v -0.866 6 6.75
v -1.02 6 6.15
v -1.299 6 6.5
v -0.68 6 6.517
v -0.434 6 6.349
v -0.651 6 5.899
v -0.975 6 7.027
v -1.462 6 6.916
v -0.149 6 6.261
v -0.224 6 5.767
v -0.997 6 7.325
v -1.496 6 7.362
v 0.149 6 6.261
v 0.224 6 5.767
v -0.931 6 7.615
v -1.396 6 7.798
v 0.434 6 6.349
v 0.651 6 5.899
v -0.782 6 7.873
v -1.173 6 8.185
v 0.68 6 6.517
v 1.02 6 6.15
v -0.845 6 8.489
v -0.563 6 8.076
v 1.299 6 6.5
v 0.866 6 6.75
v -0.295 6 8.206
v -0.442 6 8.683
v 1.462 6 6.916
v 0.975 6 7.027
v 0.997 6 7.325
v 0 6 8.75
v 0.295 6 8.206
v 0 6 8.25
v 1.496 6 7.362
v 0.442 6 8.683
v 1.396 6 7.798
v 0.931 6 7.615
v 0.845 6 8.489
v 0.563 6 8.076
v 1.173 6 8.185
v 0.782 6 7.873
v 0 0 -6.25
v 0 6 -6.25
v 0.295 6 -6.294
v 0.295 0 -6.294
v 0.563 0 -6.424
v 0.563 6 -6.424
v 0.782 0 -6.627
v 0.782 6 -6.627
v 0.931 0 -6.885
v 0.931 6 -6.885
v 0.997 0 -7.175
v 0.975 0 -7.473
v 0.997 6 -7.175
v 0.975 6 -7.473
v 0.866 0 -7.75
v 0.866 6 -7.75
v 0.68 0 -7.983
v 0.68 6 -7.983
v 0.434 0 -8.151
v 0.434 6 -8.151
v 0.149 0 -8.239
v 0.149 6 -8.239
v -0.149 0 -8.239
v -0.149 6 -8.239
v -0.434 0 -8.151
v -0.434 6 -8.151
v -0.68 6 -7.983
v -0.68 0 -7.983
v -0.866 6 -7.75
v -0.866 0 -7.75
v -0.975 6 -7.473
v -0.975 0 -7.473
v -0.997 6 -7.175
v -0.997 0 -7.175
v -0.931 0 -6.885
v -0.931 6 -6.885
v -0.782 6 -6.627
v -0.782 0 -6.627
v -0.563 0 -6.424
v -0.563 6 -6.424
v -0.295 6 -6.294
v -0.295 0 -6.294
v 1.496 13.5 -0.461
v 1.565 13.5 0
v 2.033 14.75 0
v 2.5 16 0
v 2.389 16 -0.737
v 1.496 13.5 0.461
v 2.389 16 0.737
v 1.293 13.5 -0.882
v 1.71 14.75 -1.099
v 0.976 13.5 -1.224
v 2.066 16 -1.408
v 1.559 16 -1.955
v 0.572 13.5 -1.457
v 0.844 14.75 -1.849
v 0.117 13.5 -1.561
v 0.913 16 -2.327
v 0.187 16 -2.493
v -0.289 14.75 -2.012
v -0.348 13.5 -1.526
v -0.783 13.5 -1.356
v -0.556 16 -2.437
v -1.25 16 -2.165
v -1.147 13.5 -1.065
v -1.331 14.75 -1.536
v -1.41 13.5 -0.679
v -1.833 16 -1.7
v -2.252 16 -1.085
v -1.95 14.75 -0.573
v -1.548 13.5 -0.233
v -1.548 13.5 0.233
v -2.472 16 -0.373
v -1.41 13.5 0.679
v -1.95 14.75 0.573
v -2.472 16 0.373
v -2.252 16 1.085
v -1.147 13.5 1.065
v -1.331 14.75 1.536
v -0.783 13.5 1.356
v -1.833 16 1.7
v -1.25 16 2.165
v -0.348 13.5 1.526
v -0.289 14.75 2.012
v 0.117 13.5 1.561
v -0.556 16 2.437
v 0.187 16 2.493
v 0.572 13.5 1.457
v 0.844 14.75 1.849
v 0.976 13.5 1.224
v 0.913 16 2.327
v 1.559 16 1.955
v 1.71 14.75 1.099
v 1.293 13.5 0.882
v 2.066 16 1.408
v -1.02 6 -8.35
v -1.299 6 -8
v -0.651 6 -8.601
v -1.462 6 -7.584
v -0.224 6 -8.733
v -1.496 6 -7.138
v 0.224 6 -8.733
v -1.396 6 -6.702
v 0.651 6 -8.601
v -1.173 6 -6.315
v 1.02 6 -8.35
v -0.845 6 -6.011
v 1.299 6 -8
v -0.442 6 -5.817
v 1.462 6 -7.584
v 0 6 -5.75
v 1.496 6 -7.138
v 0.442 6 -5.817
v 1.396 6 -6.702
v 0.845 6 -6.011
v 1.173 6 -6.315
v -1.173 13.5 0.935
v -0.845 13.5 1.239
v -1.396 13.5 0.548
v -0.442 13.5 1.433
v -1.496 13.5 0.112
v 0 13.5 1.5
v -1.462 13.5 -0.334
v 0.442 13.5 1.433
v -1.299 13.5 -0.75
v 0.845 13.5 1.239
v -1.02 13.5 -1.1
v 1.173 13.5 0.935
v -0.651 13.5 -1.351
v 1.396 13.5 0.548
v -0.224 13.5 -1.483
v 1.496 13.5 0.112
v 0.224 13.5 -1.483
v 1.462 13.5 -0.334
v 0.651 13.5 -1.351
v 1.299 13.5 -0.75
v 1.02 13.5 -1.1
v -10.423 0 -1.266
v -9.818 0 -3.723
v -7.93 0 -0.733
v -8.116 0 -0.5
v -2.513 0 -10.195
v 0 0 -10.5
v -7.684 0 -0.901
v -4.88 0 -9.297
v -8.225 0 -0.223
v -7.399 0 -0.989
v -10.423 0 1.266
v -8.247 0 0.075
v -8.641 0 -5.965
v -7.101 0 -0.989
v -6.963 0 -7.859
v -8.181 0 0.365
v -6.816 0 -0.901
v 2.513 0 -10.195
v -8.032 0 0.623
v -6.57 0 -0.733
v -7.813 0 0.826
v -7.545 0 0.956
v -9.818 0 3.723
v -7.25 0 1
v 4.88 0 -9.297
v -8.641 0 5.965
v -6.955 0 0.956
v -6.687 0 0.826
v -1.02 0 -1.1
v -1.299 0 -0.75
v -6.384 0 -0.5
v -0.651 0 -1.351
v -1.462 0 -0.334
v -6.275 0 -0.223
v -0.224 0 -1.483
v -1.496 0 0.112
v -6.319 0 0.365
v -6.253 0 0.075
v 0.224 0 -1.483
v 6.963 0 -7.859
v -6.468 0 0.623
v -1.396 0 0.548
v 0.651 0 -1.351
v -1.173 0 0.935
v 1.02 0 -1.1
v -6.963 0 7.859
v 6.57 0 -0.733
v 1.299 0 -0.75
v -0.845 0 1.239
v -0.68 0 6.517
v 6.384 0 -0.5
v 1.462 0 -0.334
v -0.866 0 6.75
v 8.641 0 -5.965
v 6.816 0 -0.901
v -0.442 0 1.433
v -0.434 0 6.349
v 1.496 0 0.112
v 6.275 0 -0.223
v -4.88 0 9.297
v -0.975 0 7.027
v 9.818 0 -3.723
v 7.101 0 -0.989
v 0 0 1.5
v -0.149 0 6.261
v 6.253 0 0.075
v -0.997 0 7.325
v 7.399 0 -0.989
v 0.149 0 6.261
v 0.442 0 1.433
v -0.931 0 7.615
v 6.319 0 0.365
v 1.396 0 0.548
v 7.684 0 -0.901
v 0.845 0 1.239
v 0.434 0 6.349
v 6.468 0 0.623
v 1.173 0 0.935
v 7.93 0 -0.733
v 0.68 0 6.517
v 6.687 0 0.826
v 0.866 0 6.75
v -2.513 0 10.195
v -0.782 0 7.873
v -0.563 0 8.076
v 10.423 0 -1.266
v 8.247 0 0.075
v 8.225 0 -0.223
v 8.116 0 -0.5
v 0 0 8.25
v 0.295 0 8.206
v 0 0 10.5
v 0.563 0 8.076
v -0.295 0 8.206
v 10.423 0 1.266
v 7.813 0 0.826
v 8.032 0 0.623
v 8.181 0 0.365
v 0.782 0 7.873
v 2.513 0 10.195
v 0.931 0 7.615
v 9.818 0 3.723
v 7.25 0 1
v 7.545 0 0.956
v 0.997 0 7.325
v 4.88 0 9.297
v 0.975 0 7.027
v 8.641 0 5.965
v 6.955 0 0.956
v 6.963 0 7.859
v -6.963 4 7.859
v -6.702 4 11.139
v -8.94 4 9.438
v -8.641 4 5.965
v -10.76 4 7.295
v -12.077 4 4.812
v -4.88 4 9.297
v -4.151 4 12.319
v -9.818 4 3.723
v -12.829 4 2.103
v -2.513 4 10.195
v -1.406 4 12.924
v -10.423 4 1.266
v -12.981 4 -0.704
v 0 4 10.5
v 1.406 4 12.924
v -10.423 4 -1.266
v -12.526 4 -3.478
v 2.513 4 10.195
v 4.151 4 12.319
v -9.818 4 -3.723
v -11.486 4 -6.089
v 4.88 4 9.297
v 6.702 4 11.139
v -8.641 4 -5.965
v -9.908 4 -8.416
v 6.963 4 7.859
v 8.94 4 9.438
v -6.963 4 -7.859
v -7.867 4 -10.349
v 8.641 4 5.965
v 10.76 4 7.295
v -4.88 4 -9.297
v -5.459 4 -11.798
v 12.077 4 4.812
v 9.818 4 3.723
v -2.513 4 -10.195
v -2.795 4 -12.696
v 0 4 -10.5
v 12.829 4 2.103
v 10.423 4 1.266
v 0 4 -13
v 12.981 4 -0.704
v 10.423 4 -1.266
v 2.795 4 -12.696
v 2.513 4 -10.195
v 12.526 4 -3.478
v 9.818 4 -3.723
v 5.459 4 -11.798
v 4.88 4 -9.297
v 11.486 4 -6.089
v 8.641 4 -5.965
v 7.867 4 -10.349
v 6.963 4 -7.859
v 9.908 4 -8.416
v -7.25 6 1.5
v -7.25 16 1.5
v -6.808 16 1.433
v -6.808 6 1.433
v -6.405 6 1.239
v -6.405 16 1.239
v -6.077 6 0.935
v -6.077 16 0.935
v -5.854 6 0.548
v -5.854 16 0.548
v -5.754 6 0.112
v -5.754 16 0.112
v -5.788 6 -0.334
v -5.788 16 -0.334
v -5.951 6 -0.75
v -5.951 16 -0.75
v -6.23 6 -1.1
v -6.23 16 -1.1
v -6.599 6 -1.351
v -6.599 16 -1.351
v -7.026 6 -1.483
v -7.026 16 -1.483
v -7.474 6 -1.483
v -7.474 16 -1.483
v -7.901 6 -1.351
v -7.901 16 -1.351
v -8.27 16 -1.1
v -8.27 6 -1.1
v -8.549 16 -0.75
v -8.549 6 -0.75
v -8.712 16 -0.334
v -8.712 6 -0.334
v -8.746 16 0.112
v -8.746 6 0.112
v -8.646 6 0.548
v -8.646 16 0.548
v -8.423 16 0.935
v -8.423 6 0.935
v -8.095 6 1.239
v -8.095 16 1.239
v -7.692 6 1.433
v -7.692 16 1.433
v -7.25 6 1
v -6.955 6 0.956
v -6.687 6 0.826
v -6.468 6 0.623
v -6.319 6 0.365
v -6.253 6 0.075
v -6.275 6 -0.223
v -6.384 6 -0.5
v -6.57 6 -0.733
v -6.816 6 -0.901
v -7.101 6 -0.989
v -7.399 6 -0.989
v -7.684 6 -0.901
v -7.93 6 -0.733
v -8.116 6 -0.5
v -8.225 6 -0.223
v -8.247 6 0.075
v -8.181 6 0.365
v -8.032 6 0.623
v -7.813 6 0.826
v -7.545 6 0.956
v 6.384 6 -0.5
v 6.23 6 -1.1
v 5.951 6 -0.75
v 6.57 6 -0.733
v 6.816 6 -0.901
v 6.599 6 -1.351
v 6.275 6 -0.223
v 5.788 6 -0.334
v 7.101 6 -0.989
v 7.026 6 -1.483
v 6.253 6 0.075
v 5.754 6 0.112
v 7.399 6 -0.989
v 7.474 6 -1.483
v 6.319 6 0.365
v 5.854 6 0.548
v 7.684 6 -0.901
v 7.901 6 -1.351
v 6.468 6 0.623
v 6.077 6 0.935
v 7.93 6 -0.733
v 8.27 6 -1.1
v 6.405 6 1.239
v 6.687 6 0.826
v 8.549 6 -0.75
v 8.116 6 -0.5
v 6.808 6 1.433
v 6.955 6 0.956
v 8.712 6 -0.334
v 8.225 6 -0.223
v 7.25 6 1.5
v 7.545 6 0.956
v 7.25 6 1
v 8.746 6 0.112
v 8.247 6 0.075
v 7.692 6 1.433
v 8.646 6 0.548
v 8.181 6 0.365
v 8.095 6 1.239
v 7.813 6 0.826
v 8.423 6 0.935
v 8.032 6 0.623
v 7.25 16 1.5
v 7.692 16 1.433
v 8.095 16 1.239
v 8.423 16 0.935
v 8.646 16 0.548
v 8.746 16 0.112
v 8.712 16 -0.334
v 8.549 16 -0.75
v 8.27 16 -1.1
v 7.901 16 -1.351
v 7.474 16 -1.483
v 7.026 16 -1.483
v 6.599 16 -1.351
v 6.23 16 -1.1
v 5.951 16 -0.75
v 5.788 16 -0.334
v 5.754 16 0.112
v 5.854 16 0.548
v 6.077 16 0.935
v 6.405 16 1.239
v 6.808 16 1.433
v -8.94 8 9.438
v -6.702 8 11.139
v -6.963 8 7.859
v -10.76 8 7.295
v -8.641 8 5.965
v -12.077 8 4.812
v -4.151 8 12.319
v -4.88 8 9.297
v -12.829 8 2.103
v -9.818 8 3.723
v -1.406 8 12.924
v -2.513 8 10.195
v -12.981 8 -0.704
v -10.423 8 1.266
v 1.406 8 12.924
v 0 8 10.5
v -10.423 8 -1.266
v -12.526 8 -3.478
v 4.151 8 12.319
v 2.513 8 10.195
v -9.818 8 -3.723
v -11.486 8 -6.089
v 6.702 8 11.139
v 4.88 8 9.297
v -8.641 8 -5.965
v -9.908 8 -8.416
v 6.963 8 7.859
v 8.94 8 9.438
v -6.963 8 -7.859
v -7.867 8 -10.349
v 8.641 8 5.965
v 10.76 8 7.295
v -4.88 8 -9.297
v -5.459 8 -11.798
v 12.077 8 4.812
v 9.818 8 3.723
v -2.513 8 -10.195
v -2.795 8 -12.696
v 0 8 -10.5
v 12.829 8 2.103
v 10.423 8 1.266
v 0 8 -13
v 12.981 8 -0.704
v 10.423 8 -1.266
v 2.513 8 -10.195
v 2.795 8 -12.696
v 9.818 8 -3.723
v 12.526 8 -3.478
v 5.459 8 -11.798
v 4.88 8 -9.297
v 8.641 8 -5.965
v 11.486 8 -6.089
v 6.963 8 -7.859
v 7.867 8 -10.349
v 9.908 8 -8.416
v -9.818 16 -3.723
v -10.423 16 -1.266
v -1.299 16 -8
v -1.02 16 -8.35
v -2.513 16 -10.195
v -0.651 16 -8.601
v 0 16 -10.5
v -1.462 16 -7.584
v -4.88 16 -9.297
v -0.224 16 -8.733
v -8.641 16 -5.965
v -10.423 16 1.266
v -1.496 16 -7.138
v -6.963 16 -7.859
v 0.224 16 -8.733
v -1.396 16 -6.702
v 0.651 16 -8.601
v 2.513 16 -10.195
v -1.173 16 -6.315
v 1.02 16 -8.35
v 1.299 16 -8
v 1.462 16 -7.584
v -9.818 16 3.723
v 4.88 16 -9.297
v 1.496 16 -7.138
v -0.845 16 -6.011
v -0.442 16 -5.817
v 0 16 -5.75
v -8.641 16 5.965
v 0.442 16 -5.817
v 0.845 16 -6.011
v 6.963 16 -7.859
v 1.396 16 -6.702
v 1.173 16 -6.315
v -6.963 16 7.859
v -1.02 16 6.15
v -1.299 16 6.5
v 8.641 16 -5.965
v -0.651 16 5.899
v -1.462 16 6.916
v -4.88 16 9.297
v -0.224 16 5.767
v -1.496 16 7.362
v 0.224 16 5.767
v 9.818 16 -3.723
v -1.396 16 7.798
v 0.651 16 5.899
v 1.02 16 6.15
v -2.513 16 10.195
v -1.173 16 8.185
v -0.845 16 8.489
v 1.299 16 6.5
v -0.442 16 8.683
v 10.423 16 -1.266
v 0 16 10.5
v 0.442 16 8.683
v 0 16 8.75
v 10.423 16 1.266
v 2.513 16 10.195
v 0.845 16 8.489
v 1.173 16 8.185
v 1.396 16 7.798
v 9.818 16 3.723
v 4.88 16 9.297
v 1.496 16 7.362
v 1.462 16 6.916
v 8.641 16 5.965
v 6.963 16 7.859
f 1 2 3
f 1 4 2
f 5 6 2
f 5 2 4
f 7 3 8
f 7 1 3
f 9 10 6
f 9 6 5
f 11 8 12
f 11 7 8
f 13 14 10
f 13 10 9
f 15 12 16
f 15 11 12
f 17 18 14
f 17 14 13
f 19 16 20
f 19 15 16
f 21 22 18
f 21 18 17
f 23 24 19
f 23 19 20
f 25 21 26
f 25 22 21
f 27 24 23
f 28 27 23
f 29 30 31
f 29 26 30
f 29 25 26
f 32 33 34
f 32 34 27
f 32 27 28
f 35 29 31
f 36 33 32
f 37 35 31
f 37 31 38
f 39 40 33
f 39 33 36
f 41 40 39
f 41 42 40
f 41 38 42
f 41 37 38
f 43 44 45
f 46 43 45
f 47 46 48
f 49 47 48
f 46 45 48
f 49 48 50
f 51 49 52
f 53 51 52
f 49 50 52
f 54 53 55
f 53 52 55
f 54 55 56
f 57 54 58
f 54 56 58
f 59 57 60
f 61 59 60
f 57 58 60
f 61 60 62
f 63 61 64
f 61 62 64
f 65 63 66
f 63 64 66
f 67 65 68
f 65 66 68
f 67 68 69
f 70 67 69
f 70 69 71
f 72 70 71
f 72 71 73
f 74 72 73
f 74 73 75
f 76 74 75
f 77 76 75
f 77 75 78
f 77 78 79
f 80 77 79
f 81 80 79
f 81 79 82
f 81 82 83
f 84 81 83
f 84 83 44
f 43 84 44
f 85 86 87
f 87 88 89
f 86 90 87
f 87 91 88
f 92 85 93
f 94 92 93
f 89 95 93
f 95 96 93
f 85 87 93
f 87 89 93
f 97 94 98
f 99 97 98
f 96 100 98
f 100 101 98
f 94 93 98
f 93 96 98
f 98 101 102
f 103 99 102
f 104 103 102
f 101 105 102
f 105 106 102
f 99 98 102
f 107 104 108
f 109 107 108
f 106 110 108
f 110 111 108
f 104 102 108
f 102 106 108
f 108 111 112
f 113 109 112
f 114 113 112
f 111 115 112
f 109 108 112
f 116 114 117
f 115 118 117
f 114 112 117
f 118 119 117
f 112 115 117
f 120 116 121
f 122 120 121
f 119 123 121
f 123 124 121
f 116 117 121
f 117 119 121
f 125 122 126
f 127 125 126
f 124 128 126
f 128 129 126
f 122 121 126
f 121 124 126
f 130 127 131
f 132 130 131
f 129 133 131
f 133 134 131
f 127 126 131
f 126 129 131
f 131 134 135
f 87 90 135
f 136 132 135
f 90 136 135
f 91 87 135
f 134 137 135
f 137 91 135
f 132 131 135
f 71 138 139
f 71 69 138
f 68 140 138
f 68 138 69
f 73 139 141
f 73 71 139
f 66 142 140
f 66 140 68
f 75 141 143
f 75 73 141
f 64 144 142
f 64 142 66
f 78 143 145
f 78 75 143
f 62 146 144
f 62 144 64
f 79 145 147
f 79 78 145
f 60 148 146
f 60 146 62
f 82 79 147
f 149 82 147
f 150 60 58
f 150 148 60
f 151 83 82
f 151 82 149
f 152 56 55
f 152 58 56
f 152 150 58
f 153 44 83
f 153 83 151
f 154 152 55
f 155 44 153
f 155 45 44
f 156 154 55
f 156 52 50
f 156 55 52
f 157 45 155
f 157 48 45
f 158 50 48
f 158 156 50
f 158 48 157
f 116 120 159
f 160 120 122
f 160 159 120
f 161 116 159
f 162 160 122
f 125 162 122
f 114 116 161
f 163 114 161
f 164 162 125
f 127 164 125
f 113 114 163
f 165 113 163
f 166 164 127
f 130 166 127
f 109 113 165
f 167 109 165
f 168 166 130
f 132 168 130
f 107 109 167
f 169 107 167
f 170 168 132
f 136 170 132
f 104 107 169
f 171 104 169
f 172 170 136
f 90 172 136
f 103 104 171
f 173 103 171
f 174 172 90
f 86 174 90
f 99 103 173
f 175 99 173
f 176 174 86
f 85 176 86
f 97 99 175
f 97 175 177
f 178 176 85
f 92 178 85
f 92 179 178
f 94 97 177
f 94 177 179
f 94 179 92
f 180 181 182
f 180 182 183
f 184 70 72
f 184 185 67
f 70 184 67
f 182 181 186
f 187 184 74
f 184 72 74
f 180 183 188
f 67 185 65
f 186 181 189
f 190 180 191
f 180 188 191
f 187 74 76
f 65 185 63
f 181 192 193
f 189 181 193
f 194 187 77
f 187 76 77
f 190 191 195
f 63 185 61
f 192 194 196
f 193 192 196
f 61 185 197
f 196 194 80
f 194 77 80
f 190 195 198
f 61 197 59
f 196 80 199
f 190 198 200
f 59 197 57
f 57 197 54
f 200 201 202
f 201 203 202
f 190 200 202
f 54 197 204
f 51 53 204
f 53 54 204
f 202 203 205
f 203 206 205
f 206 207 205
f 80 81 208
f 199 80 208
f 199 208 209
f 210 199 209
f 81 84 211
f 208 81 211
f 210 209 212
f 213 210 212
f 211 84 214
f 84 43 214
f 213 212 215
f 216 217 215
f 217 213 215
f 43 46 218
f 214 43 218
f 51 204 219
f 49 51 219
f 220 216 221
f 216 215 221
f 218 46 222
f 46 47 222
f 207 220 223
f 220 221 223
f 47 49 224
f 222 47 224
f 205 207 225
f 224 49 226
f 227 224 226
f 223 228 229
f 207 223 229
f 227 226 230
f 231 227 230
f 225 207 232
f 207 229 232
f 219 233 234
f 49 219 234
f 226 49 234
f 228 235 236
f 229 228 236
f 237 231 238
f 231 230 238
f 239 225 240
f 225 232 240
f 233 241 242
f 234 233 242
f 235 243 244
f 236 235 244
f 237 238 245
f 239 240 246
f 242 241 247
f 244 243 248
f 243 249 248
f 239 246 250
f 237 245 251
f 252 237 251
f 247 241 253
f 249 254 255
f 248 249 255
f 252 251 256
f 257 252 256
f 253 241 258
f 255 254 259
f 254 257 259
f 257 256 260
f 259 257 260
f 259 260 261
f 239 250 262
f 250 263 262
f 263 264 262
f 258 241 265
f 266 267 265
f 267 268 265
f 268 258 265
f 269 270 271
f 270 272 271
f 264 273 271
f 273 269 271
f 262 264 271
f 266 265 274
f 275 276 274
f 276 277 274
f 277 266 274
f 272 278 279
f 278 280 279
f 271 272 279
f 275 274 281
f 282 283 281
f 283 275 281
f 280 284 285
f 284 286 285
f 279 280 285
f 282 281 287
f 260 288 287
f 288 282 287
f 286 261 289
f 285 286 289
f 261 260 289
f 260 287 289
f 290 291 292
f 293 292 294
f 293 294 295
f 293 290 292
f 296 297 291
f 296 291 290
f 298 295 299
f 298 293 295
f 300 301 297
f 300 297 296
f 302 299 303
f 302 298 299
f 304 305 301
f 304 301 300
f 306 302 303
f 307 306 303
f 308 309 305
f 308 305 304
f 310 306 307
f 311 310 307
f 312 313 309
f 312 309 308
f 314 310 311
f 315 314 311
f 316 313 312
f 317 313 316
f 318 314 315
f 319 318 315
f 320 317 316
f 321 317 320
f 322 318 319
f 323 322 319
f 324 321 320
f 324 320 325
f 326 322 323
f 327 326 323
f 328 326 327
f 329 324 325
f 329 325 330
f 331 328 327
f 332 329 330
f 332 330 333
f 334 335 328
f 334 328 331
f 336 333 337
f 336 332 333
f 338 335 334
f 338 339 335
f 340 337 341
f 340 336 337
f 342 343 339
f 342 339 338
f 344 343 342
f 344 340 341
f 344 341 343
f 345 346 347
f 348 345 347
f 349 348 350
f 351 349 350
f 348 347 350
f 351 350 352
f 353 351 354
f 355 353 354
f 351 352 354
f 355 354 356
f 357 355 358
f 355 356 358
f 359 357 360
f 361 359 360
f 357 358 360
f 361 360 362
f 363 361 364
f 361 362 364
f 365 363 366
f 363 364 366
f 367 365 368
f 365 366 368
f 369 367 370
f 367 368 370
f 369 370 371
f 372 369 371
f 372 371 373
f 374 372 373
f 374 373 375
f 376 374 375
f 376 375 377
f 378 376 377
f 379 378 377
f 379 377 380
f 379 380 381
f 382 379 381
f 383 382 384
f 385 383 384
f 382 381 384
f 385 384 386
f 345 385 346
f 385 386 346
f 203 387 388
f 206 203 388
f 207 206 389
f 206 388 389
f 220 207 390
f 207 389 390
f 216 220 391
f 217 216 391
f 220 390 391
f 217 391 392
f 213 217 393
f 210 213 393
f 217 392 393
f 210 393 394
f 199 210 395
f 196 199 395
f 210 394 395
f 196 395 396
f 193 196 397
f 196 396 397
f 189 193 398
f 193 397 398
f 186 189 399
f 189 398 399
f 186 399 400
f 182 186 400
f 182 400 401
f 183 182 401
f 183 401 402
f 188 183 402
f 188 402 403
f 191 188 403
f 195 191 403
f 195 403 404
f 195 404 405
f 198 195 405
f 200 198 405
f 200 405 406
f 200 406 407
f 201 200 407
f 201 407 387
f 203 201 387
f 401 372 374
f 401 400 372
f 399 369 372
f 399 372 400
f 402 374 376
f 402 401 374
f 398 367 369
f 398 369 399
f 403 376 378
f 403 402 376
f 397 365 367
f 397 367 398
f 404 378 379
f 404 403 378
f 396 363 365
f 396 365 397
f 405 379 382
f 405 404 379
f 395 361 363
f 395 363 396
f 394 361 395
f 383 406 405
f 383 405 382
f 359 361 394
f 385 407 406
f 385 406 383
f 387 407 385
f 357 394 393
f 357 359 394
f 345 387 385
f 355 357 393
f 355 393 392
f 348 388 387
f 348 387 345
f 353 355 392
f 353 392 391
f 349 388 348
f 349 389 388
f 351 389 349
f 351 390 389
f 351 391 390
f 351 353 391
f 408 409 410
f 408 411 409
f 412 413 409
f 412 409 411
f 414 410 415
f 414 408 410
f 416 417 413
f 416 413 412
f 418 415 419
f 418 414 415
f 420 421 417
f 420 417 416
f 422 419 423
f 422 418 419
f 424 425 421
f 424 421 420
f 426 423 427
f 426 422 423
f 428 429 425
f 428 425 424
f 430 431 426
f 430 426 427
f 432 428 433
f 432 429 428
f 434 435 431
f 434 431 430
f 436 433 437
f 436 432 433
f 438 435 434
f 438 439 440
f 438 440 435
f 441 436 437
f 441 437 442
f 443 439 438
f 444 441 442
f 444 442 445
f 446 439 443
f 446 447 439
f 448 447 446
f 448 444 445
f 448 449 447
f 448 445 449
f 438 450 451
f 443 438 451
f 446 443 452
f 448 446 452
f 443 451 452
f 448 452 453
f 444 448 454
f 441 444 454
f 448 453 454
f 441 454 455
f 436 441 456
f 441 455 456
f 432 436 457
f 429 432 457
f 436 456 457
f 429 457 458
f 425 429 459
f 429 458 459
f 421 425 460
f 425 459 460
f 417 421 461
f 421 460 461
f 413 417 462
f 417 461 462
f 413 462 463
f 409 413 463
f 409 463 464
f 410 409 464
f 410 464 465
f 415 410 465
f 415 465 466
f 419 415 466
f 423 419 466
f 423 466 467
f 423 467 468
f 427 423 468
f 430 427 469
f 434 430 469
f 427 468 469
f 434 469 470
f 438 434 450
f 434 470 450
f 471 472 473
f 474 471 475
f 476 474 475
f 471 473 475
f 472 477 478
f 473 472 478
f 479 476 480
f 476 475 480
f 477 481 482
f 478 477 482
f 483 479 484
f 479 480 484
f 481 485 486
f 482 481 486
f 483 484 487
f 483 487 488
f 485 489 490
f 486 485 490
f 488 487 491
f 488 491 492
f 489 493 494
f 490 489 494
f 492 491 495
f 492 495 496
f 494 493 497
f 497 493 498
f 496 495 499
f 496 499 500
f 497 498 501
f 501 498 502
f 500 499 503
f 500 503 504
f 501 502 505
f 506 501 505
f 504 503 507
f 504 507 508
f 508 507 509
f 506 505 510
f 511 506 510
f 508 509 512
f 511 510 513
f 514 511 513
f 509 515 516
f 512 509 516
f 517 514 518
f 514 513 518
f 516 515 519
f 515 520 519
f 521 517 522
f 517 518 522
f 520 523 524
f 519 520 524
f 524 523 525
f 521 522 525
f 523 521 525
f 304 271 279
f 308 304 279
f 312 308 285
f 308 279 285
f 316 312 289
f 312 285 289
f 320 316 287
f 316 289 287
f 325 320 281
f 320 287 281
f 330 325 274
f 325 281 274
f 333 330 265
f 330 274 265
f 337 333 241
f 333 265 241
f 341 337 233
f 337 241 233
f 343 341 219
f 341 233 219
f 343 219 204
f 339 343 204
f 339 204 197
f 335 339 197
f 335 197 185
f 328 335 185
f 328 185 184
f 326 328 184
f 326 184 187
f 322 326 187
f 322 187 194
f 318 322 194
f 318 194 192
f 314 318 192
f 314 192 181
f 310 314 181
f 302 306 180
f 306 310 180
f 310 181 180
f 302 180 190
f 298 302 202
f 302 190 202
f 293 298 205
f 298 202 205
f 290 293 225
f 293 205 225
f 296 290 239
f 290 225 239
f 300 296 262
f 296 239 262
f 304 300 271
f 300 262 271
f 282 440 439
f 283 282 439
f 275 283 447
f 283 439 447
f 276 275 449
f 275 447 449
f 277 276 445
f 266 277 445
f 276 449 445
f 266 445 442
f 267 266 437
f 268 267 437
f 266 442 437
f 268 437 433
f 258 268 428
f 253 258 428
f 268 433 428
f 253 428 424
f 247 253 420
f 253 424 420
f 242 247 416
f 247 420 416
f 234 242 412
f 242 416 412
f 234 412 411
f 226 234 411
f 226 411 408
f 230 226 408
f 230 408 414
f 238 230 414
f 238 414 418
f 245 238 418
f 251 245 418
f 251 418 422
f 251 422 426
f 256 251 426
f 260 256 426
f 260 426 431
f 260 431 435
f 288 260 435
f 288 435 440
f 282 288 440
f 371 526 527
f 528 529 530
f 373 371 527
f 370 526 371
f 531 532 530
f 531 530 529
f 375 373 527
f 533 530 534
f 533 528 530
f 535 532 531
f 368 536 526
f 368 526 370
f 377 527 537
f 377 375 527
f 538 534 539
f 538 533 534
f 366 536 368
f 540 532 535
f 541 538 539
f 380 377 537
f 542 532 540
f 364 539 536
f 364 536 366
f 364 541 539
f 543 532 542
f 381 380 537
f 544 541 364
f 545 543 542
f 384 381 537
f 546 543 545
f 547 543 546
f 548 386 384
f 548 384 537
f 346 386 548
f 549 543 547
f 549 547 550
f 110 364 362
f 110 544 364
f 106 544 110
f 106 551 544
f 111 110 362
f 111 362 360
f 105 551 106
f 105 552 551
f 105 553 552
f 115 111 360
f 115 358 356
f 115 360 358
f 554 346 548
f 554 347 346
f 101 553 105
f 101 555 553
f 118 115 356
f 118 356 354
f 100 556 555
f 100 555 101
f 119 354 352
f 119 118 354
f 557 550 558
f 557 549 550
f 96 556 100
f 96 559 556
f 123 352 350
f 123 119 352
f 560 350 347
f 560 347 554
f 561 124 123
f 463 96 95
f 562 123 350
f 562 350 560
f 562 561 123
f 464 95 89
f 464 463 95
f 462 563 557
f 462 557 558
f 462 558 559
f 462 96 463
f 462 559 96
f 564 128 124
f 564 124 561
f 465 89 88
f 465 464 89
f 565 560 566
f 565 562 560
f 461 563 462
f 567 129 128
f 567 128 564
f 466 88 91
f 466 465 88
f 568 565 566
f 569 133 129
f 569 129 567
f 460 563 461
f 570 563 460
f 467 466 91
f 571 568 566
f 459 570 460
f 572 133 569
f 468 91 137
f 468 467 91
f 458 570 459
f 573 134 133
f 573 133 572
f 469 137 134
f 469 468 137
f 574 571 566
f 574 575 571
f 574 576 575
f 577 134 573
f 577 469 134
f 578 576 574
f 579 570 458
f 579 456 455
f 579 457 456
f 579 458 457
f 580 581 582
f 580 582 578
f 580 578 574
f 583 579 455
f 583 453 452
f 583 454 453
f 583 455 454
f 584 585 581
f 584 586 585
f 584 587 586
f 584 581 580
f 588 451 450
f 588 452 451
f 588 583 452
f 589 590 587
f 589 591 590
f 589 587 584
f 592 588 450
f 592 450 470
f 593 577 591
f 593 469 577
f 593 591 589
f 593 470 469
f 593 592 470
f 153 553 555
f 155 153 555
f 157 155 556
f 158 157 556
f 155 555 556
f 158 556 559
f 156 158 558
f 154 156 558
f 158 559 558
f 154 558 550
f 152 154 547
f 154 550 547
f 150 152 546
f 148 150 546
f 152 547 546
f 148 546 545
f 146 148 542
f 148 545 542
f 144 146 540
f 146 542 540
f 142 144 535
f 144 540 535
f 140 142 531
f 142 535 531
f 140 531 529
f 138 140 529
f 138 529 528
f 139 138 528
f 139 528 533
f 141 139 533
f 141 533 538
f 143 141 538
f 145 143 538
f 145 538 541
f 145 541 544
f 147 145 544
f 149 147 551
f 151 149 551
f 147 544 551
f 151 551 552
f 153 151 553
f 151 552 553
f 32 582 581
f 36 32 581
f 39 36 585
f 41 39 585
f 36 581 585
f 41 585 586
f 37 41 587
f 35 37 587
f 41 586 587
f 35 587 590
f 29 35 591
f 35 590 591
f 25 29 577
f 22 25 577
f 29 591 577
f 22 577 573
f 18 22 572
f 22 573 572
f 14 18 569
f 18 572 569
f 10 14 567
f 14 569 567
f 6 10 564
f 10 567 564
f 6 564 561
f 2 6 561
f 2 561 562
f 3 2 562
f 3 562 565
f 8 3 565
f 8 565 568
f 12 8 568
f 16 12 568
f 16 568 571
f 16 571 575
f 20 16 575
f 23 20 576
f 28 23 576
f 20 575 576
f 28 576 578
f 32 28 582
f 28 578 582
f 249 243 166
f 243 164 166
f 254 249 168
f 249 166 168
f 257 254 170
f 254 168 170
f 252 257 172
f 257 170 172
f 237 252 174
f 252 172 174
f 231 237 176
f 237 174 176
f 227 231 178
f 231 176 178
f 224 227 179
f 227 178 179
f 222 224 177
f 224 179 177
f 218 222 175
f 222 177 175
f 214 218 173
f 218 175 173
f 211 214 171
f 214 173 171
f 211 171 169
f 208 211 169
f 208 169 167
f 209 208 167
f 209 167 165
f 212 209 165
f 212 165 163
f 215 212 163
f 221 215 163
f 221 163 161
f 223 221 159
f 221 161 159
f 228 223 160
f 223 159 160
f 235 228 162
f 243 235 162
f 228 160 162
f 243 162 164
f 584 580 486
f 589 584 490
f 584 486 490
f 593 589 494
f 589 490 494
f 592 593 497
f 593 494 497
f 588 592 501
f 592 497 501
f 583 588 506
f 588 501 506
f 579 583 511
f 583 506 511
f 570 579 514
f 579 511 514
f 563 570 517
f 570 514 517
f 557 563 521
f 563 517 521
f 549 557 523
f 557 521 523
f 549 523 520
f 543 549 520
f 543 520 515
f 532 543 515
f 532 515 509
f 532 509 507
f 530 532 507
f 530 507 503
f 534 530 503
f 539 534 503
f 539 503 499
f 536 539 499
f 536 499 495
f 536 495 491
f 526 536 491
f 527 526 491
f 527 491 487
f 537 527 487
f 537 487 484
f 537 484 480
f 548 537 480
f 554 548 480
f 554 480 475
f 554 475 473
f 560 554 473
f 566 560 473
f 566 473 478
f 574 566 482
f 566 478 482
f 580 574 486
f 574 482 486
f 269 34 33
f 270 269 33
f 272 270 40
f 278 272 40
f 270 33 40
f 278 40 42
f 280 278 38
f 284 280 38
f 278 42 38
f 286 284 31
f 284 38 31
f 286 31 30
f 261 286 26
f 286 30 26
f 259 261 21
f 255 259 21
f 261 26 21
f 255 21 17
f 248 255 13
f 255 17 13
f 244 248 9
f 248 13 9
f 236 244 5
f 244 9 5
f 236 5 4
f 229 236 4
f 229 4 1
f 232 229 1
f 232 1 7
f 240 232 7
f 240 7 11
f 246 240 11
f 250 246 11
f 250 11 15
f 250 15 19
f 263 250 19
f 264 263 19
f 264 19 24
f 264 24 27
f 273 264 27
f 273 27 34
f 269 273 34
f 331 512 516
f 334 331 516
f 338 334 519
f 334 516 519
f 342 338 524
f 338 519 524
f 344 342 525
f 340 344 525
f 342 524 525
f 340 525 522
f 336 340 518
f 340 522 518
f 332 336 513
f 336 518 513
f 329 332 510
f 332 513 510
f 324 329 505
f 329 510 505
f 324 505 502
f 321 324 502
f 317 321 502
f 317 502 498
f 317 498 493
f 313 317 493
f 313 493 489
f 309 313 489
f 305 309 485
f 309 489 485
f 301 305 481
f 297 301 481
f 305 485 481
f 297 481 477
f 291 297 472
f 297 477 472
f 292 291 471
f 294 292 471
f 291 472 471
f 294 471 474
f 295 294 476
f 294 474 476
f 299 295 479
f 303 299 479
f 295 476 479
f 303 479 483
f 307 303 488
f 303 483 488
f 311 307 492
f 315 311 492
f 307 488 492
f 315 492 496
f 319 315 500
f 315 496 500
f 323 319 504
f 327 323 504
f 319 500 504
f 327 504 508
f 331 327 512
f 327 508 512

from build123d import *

# Parameters (mm, degrees)
SKETCH1_R                = 10.5
BOSS_EXTRUDE1_DEPTH      = 16
SKETCH2_R                = 1.5
CUT_EXTRUDE1_DEPTH       = 22.828879953
SKETCH3_R                = 2.5
CUT_EXTRUDE2_DEPTH       = 2.5
CUT_EXTRUDE2_DRAFT       = -20.5
BOSS_EXTRUDE2_DEPTH      = 2
BOSS_EXTRUDE2_DEPTH_BACK = 2
SKETCH5_R                = 13
SKETCH7_R                = 1.5
CUT_EXTRUDE3_DEPTH       = 10
SKETCH8_R                = 1
CUT_EXTRUDE4_DEPTH       = 21.928449536
SKETCH9_R                = 1.5
CUT_EXTRUDE5_DEPTH       = 25.372115214


with BuildPart() as part:
    # Sketch1 → Boss-Extrude1 (new body)
    with BuildSketch(Plane(origin=(0, 0, 0), x_dir=(1, 0, 0), z_dir=(0, 1, 0))):
        with Locations(Location((0, 0, 0), (0, 0, 270))):
            Circle(SKETCH1_R)
    extrude(amount=BOSS_EXTRUDE1_DEPTH)

    # Sketch2 → Cut-Extrude1 (cut, through all)
    with BuildSketch(Plane(origin=(0, 16, 0), x_dir=(1, 0, 0), z_dir=(0, 1, 0))):
        with Locations(Location((0, 0, 0), (0, 0, 270))):
            Circle(SKETCH2_R)
    extrude(amount=-CUT_EXTRUDE1_DEPTH, mode=Mode.SUBTRACT)


with BuildPart() as cut_extrude2_tool:
    # Sketch3 → Cut-Extrude2 (with draft: the straight prism first)
    with BuildSketch(Plane(origin=(0, 16, 0), x_dir=(1, 0, 0), z_dir=(0, 1, 0))):
        Circle(SKETCH3_R)
    extrude(amount=-CUT_EXTRUDE2_DEPTH)
    # Cut-Extrude2: the draft: its side faces are tilted about the plane it starts from
    cut_extrude2_sides = [cut_extrude2_tool.faces().sort_by_distance(p)[0] for p in [
        (-2.5, 14.75, 0),
    ]]
    draft(cut_extrude2_sides, Plane(origin=(0, 16, 0), x_dir=(1, 0, 0), z_dir=(0, 1, 0)), CUT_EXTRUDE2_DRAFT)


with BuildPart() as part_1:
    add(part.part)

    # Cut-Extrude2: cut by cut_extrude2_tool
    add(cut_extrude2_tool.part, mode=Mode.SUBTRACT)

    # Sketch5 → Boss-Extrude2 (add, two sides: drawn at the far end of the back side and taken through both)
    with BuildSketch(Plane(origin=(0, 6, 0), x_dir=(-1, 0, 0), z_dir=(0, -1, 0)).offset(-BOSS_EXTRUDE2_DEPTH_BACK)):
        with Locations(Location((0, 0, 0), (0, 0, 90))):
            Circle(SKETCH5_R)
    extrude(amount=BOSS_EXTRUDE2_DEPTH + BOSS_EXTRUDE2_DEPTH_BACK)

    # Sketch7 → Cut-Extrude3 (cut)
    with BuildSketch(Plane(origin=(0, 16, 0), x_dir=(1, 0, 0), z_dir=(0, 1, 0))):
        with Locations(Location((0, 7.25, 0), (0, 0, 270))):
            Circle(SKETCH7_R)
        with Locations(Location((7.25, 0, 0), (0, 0, 270))):
            Circle(SKETCH7_R)
        with Locations(Location((0, -7.25, 0), (0, 0, 270))):
            Circle(SKETCH7_R)
        with Locations(Location((-7.25, 0, 0), (0, 0, 270))):
            Circle(SKETCH7_R)
    extrude(amount=-CUT_EXTRUDE3_DEPTH, mode=Mode.SUBTRACT)

    # Sketch8 → Cut-Extrude4 (cut, through all)
    with BuildSketch(Plane(origin=(0, 6, 0), x_dir=(1, 0, 0), z_dir=(0, 1, 0))):
        with Locations(Location((-7.25, 0, 0), (0, 0, 270))):
            Circle(SKETCH8_R)
        with Locations(Location((0, 7.25, 0), (0, 0, 270))):
            Circle(SKETCH8_R)
        with Locations(Location((7.25, 0, 0), (0, 0, 270))):
            Circle(SKETCH8_R)
        with Locations(Location((0, -7.25, 0), (0, 0, 270))):
            Circle(SKETCH8_R)
    extrude(amount=-CUT_EXTRUDE4_DEPTH, mode=Mode.SUBTRACT)

    # Sketch9 → Cut-Extrude5 (cut, through all)
    with BuildSketch(Plane(origin=(0, 16, 0), x_dir=(1, 0, 0), z_dir=(0, 1, 0))):
        with Locations(Location((0, 0, 0), (0, 0, 270))):
            Circle(SKETCH9_R)
    extrude(amount=-CUT_EXTRUDE5_DEPTH, mode=Mode.SUBTRACT)


solid = part_1.part
